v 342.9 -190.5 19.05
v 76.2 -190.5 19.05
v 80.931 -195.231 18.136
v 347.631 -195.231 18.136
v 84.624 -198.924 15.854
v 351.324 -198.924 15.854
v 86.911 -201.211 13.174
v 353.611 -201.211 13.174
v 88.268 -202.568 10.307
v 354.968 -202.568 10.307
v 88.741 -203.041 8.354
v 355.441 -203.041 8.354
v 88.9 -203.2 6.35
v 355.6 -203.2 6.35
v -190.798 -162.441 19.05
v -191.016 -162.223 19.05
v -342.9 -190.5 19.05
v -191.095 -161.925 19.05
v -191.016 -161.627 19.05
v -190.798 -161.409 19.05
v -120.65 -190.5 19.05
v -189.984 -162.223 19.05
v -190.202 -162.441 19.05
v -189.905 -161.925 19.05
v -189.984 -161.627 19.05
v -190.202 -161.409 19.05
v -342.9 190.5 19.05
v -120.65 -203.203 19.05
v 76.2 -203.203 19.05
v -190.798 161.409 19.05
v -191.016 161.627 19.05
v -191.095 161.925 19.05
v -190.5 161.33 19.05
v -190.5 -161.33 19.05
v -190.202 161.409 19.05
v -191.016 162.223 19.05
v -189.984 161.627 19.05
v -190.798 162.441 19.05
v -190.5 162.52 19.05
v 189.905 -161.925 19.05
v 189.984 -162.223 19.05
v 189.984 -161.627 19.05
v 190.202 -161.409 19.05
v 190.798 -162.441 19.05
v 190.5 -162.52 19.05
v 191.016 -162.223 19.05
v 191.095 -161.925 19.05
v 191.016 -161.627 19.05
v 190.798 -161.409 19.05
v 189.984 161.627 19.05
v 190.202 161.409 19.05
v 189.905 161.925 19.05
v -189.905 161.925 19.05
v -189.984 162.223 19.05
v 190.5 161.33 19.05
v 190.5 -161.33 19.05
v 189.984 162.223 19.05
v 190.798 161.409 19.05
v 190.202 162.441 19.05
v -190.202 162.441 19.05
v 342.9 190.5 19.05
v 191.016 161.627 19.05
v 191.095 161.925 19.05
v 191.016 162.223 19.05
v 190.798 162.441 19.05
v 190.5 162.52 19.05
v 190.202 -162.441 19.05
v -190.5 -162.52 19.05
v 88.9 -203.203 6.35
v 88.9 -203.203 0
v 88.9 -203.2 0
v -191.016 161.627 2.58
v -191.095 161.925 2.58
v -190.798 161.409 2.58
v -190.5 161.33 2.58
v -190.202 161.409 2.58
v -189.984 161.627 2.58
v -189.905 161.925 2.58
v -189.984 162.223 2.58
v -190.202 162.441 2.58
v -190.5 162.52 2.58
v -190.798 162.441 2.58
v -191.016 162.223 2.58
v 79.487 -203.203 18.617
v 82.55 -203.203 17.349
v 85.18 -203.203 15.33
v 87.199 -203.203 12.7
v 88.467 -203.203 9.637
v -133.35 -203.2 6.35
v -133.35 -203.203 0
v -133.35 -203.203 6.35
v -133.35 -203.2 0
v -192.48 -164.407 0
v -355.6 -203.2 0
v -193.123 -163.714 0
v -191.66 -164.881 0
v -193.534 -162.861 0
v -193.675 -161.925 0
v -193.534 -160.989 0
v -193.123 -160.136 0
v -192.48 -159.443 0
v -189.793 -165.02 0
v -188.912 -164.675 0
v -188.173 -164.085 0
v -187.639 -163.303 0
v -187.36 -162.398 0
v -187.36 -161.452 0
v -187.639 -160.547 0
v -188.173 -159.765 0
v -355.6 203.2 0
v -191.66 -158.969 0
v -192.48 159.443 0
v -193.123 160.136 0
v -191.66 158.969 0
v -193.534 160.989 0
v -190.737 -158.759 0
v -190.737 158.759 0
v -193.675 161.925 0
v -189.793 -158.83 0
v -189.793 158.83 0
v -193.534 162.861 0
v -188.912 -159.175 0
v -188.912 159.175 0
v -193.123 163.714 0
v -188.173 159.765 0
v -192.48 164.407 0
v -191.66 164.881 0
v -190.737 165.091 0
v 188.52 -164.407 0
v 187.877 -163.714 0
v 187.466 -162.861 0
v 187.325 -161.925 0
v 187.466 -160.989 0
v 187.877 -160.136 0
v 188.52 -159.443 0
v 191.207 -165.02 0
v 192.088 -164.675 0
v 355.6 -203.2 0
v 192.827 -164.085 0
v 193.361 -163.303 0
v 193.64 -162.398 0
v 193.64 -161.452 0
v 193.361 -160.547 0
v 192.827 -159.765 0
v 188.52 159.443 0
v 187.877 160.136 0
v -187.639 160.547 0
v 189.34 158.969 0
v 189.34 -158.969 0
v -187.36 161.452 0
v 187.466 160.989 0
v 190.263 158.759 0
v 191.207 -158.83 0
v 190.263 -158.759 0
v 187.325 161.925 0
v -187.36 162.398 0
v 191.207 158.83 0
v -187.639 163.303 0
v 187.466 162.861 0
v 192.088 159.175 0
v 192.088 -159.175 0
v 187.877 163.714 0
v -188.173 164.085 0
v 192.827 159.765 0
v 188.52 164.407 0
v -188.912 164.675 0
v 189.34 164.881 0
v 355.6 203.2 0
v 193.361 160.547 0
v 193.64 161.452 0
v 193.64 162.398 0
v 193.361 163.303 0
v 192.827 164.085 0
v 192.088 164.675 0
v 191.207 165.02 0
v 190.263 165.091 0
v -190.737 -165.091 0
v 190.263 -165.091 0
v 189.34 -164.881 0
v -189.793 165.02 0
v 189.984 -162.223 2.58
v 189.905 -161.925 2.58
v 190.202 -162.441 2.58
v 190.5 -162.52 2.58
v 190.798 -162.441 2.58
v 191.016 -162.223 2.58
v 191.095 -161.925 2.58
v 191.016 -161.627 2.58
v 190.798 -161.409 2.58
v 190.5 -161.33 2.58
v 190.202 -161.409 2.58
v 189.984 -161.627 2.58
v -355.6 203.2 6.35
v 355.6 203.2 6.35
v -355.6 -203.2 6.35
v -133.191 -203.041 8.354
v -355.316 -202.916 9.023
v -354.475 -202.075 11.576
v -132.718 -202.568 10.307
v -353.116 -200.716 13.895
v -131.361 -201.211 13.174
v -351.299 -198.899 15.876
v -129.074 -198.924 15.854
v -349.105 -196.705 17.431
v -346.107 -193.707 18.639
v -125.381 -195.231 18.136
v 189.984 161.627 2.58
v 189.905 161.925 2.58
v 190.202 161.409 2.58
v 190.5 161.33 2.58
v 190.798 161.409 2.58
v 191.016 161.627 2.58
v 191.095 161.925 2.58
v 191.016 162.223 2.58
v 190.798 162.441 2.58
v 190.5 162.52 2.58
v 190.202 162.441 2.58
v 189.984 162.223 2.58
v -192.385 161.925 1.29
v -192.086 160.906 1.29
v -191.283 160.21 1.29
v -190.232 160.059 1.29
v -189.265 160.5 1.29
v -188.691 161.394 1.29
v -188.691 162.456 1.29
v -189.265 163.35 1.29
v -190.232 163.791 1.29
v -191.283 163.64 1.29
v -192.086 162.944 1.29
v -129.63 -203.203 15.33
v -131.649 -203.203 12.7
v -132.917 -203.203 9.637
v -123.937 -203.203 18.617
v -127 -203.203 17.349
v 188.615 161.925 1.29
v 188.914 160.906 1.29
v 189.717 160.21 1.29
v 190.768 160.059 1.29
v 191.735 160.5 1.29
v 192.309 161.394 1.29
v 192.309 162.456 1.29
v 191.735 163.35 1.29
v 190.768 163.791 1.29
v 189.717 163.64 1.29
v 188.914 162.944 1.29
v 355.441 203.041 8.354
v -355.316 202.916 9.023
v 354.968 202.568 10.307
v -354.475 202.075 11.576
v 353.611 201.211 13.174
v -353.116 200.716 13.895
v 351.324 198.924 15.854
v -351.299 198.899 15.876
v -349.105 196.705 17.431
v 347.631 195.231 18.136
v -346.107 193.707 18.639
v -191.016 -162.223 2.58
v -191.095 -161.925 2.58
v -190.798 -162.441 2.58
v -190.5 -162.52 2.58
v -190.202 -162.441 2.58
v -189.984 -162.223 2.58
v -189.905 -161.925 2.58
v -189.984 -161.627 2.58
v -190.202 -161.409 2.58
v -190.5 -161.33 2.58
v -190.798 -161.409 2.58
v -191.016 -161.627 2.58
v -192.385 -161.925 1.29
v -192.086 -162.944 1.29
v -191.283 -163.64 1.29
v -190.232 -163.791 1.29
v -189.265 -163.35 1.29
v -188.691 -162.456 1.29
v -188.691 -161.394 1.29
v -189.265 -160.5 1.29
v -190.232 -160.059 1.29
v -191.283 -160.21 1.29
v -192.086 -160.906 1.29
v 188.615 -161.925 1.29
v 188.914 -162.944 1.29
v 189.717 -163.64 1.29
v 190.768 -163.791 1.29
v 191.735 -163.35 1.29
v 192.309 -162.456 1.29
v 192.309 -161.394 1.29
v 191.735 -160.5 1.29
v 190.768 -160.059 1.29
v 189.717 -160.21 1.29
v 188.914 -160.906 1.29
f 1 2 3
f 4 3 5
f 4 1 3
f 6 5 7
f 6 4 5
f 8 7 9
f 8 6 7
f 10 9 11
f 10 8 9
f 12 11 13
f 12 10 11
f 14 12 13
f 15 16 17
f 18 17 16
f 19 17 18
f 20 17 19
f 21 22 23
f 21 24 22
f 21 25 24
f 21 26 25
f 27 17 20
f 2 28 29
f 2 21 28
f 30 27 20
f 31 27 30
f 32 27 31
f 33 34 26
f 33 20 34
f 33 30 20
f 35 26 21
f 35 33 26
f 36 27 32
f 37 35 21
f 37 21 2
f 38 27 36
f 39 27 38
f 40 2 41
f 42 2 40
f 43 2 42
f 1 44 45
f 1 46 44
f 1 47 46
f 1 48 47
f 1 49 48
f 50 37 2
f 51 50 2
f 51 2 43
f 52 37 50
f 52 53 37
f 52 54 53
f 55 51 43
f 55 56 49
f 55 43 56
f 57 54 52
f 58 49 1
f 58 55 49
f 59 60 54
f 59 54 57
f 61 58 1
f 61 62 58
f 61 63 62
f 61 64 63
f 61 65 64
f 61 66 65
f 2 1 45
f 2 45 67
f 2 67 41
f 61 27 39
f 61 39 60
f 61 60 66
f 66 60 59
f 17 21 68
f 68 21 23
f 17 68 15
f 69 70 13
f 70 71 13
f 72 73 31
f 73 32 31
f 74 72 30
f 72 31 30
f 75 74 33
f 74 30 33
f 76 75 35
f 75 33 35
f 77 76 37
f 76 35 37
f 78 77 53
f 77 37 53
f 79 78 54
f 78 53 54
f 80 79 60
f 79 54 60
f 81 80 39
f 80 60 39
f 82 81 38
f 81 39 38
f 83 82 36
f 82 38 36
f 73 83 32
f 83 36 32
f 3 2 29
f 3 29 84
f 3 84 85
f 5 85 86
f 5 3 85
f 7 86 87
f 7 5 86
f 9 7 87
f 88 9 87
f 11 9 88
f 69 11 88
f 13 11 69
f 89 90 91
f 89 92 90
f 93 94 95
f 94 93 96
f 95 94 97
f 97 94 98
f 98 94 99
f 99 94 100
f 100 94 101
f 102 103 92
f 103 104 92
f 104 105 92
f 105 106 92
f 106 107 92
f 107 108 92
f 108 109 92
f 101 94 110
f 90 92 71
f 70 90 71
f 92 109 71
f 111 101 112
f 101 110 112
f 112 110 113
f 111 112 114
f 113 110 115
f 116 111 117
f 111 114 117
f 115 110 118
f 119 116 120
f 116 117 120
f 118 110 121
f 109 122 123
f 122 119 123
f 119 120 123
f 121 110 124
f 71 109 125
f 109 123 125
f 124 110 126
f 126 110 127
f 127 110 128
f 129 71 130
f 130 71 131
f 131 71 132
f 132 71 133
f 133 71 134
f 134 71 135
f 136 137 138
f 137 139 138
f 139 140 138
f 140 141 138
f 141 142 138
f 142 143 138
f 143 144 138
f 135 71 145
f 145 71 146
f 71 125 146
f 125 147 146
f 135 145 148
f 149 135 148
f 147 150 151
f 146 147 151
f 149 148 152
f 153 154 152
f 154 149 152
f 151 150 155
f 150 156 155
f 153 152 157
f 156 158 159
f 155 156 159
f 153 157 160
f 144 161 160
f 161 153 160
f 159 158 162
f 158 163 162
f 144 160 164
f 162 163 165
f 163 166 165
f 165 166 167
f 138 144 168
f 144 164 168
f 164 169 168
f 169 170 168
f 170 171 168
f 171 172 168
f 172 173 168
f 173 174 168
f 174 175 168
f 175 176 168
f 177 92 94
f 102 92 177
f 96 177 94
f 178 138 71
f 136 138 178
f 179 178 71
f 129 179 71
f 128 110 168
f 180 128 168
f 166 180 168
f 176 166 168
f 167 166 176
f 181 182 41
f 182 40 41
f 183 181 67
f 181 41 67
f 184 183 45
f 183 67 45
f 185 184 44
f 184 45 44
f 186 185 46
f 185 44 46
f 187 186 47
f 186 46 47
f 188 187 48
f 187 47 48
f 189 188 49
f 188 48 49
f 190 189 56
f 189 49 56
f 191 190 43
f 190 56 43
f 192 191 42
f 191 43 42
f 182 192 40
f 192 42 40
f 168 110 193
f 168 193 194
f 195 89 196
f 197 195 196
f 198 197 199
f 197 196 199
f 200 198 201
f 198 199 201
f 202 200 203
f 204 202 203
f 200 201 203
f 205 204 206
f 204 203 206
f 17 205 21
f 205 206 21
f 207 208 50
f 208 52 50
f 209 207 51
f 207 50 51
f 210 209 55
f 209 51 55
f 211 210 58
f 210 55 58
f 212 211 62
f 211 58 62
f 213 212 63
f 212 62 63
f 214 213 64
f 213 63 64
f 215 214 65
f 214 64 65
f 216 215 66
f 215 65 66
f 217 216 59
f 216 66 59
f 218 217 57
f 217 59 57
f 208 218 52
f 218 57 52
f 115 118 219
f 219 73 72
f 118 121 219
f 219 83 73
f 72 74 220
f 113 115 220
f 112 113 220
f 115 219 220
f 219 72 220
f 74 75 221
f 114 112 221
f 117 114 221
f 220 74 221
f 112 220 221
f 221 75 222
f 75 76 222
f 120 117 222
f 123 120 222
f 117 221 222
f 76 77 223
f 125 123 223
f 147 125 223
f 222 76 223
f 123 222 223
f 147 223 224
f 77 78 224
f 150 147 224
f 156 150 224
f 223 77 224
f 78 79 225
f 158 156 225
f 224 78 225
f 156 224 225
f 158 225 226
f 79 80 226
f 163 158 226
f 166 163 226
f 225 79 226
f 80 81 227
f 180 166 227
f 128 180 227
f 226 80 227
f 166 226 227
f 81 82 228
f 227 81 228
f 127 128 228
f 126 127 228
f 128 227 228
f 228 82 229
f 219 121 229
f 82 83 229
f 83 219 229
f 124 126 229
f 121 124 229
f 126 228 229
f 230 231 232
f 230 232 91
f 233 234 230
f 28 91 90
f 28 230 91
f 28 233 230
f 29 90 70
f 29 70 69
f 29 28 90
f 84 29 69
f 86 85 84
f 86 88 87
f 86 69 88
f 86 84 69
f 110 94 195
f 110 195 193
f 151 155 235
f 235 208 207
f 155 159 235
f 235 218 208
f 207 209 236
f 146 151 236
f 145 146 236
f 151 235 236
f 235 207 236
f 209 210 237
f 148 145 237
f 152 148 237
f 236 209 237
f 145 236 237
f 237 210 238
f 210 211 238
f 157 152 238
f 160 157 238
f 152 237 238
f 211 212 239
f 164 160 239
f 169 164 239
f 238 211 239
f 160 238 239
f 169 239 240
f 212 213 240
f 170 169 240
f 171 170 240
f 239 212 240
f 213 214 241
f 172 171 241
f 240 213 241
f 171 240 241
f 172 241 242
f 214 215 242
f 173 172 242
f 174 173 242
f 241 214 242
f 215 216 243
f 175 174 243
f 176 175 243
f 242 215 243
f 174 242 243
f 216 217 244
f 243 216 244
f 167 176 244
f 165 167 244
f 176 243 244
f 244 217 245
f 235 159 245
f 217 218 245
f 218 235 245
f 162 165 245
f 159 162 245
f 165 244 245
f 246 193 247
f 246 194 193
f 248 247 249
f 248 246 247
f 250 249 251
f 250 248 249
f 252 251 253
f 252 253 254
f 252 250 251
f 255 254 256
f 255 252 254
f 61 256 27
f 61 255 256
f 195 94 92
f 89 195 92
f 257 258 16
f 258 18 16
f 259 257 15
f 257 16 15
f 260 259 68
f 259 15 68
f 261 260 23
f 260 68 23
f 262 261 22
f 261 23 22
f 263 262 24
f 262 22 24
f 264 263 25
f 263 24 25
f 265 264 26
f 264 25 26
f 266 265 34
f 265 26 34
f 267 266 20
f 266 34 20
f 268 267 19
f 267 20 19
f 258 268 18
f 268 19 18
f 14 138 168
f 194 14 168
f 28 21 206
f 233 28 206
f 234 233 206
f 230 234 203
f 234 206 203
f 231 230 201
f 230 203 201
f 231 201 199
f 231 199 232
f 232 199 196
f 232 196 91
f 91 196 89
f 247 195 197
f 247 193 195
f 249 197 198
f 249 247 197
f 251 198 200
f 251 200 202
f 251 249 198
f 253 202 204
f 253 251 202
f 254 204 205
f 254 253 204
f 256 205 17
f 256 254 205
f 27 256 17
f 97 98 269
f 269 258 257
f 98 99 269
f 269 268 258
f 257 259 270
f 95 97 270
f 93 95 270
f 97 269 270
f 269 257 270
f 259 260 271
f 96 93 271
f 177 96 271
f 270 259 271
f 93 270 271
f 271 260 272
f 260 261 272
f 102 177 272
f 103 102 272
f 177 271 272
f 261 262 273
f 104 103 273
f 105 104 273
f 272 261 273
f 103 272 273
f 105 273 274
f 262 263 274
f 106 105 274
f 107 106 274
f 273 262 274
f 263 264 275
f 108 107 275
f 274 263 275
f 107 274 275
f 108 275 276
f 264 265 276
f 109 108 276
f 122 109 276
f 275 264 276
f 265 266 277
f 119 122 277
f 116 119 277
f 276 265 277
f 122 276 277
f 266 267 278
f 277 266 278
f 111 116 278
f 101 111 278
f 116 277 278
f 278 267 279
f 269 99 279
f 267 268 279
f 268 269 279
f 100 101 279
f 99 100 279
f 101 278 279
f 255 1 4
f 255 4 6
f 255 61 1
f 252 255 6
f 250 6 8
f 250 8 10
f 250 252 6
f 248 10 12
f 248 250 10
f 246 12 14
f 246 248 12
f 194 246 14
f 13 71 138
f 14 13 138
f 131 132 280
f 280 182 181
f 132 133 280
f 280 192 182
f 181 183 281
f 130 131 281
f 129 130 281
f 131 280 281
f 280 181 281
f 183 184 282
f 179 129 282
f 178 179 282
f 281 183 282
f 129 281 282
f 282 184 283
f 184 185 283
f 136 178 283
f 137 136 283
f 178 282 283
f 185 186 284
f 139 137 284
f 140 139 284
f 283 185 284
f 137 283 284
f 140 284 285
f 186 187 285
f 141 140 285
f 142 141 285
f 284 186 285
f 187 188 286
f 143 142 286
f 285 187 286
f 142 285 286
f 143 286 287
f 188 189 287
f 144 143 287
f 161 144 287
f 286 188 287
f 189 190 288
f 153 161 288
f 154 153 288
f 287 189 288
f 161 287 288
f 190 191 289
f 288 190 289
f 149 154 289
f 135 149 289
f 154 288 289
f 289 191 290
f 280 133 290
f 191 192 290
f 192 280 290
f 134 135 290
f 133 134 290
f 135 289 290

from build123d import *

# Parameters (mm, degrees)
F0_W           = 711.2
F0_H           = 406.4
F1_DEPTH       = 19.05
F2_W           = 222.25
F2_H           = 19.05
F3_DEPTH       = 0.00254
F4_R           = 12.7
F5_R           = 12.7
F7_D           = 1.190625
F7_CSINK_D     = 6.35
F7_CSINK_ANGLE = 90


with BuildPart() as f1:
    # F0 (on Top) → F1 (new body)
    with BuildSketch(Plane.XY):
        Rectangle(F0_W, F0_H)
    extrude(amount=F1_DEPTH)

    # F2 (on face) → F3 (join)
    with BuildSketch(Plane.XZ.offset(203.2)):
        with Locations((-22.225, 9.525)):
            Rectangle(F2_W, F2_H)
    extrude(amount=F3_DEPTH)

    # F4
    f4_edges = [f1.edges().sort_by_distance(p)[0] for p in [
        (-244.475, -203.2, 19.05),
        (-355.6, 0, 19.05),
        (222.25, -203.2, 19.05),
        (355.6, 0, 19.05),
        (0, 203.2, 19.05),
    ]]
    fillet(f4_edges, radius=F4_R)

    # F5
    f5_edges = [f1.edges().sort_by_distance(p)[0] for p in [
        (88.9, -203.20127, 19.05),
        (-133.35, -203.20127, 19.05),
    ]]
    fillet(f5_edges, radius=F5_R)

    # F7 (through all)
    with Locations(Plane(origin=(0, 0, 0), x_dir=(1, 0, 0), z_dir=(0, 0, -1))):
        with Locations((190.5, -161.925), (190.5, 161.925), (-190.5, -161.925), (-190.5, 161.925)):
            CounterSinkHole(F7_D / 2, F7_CSINK_D / 2, counter_sink_angle=F7_CSINK_ANGLE)


solid = f1.part
